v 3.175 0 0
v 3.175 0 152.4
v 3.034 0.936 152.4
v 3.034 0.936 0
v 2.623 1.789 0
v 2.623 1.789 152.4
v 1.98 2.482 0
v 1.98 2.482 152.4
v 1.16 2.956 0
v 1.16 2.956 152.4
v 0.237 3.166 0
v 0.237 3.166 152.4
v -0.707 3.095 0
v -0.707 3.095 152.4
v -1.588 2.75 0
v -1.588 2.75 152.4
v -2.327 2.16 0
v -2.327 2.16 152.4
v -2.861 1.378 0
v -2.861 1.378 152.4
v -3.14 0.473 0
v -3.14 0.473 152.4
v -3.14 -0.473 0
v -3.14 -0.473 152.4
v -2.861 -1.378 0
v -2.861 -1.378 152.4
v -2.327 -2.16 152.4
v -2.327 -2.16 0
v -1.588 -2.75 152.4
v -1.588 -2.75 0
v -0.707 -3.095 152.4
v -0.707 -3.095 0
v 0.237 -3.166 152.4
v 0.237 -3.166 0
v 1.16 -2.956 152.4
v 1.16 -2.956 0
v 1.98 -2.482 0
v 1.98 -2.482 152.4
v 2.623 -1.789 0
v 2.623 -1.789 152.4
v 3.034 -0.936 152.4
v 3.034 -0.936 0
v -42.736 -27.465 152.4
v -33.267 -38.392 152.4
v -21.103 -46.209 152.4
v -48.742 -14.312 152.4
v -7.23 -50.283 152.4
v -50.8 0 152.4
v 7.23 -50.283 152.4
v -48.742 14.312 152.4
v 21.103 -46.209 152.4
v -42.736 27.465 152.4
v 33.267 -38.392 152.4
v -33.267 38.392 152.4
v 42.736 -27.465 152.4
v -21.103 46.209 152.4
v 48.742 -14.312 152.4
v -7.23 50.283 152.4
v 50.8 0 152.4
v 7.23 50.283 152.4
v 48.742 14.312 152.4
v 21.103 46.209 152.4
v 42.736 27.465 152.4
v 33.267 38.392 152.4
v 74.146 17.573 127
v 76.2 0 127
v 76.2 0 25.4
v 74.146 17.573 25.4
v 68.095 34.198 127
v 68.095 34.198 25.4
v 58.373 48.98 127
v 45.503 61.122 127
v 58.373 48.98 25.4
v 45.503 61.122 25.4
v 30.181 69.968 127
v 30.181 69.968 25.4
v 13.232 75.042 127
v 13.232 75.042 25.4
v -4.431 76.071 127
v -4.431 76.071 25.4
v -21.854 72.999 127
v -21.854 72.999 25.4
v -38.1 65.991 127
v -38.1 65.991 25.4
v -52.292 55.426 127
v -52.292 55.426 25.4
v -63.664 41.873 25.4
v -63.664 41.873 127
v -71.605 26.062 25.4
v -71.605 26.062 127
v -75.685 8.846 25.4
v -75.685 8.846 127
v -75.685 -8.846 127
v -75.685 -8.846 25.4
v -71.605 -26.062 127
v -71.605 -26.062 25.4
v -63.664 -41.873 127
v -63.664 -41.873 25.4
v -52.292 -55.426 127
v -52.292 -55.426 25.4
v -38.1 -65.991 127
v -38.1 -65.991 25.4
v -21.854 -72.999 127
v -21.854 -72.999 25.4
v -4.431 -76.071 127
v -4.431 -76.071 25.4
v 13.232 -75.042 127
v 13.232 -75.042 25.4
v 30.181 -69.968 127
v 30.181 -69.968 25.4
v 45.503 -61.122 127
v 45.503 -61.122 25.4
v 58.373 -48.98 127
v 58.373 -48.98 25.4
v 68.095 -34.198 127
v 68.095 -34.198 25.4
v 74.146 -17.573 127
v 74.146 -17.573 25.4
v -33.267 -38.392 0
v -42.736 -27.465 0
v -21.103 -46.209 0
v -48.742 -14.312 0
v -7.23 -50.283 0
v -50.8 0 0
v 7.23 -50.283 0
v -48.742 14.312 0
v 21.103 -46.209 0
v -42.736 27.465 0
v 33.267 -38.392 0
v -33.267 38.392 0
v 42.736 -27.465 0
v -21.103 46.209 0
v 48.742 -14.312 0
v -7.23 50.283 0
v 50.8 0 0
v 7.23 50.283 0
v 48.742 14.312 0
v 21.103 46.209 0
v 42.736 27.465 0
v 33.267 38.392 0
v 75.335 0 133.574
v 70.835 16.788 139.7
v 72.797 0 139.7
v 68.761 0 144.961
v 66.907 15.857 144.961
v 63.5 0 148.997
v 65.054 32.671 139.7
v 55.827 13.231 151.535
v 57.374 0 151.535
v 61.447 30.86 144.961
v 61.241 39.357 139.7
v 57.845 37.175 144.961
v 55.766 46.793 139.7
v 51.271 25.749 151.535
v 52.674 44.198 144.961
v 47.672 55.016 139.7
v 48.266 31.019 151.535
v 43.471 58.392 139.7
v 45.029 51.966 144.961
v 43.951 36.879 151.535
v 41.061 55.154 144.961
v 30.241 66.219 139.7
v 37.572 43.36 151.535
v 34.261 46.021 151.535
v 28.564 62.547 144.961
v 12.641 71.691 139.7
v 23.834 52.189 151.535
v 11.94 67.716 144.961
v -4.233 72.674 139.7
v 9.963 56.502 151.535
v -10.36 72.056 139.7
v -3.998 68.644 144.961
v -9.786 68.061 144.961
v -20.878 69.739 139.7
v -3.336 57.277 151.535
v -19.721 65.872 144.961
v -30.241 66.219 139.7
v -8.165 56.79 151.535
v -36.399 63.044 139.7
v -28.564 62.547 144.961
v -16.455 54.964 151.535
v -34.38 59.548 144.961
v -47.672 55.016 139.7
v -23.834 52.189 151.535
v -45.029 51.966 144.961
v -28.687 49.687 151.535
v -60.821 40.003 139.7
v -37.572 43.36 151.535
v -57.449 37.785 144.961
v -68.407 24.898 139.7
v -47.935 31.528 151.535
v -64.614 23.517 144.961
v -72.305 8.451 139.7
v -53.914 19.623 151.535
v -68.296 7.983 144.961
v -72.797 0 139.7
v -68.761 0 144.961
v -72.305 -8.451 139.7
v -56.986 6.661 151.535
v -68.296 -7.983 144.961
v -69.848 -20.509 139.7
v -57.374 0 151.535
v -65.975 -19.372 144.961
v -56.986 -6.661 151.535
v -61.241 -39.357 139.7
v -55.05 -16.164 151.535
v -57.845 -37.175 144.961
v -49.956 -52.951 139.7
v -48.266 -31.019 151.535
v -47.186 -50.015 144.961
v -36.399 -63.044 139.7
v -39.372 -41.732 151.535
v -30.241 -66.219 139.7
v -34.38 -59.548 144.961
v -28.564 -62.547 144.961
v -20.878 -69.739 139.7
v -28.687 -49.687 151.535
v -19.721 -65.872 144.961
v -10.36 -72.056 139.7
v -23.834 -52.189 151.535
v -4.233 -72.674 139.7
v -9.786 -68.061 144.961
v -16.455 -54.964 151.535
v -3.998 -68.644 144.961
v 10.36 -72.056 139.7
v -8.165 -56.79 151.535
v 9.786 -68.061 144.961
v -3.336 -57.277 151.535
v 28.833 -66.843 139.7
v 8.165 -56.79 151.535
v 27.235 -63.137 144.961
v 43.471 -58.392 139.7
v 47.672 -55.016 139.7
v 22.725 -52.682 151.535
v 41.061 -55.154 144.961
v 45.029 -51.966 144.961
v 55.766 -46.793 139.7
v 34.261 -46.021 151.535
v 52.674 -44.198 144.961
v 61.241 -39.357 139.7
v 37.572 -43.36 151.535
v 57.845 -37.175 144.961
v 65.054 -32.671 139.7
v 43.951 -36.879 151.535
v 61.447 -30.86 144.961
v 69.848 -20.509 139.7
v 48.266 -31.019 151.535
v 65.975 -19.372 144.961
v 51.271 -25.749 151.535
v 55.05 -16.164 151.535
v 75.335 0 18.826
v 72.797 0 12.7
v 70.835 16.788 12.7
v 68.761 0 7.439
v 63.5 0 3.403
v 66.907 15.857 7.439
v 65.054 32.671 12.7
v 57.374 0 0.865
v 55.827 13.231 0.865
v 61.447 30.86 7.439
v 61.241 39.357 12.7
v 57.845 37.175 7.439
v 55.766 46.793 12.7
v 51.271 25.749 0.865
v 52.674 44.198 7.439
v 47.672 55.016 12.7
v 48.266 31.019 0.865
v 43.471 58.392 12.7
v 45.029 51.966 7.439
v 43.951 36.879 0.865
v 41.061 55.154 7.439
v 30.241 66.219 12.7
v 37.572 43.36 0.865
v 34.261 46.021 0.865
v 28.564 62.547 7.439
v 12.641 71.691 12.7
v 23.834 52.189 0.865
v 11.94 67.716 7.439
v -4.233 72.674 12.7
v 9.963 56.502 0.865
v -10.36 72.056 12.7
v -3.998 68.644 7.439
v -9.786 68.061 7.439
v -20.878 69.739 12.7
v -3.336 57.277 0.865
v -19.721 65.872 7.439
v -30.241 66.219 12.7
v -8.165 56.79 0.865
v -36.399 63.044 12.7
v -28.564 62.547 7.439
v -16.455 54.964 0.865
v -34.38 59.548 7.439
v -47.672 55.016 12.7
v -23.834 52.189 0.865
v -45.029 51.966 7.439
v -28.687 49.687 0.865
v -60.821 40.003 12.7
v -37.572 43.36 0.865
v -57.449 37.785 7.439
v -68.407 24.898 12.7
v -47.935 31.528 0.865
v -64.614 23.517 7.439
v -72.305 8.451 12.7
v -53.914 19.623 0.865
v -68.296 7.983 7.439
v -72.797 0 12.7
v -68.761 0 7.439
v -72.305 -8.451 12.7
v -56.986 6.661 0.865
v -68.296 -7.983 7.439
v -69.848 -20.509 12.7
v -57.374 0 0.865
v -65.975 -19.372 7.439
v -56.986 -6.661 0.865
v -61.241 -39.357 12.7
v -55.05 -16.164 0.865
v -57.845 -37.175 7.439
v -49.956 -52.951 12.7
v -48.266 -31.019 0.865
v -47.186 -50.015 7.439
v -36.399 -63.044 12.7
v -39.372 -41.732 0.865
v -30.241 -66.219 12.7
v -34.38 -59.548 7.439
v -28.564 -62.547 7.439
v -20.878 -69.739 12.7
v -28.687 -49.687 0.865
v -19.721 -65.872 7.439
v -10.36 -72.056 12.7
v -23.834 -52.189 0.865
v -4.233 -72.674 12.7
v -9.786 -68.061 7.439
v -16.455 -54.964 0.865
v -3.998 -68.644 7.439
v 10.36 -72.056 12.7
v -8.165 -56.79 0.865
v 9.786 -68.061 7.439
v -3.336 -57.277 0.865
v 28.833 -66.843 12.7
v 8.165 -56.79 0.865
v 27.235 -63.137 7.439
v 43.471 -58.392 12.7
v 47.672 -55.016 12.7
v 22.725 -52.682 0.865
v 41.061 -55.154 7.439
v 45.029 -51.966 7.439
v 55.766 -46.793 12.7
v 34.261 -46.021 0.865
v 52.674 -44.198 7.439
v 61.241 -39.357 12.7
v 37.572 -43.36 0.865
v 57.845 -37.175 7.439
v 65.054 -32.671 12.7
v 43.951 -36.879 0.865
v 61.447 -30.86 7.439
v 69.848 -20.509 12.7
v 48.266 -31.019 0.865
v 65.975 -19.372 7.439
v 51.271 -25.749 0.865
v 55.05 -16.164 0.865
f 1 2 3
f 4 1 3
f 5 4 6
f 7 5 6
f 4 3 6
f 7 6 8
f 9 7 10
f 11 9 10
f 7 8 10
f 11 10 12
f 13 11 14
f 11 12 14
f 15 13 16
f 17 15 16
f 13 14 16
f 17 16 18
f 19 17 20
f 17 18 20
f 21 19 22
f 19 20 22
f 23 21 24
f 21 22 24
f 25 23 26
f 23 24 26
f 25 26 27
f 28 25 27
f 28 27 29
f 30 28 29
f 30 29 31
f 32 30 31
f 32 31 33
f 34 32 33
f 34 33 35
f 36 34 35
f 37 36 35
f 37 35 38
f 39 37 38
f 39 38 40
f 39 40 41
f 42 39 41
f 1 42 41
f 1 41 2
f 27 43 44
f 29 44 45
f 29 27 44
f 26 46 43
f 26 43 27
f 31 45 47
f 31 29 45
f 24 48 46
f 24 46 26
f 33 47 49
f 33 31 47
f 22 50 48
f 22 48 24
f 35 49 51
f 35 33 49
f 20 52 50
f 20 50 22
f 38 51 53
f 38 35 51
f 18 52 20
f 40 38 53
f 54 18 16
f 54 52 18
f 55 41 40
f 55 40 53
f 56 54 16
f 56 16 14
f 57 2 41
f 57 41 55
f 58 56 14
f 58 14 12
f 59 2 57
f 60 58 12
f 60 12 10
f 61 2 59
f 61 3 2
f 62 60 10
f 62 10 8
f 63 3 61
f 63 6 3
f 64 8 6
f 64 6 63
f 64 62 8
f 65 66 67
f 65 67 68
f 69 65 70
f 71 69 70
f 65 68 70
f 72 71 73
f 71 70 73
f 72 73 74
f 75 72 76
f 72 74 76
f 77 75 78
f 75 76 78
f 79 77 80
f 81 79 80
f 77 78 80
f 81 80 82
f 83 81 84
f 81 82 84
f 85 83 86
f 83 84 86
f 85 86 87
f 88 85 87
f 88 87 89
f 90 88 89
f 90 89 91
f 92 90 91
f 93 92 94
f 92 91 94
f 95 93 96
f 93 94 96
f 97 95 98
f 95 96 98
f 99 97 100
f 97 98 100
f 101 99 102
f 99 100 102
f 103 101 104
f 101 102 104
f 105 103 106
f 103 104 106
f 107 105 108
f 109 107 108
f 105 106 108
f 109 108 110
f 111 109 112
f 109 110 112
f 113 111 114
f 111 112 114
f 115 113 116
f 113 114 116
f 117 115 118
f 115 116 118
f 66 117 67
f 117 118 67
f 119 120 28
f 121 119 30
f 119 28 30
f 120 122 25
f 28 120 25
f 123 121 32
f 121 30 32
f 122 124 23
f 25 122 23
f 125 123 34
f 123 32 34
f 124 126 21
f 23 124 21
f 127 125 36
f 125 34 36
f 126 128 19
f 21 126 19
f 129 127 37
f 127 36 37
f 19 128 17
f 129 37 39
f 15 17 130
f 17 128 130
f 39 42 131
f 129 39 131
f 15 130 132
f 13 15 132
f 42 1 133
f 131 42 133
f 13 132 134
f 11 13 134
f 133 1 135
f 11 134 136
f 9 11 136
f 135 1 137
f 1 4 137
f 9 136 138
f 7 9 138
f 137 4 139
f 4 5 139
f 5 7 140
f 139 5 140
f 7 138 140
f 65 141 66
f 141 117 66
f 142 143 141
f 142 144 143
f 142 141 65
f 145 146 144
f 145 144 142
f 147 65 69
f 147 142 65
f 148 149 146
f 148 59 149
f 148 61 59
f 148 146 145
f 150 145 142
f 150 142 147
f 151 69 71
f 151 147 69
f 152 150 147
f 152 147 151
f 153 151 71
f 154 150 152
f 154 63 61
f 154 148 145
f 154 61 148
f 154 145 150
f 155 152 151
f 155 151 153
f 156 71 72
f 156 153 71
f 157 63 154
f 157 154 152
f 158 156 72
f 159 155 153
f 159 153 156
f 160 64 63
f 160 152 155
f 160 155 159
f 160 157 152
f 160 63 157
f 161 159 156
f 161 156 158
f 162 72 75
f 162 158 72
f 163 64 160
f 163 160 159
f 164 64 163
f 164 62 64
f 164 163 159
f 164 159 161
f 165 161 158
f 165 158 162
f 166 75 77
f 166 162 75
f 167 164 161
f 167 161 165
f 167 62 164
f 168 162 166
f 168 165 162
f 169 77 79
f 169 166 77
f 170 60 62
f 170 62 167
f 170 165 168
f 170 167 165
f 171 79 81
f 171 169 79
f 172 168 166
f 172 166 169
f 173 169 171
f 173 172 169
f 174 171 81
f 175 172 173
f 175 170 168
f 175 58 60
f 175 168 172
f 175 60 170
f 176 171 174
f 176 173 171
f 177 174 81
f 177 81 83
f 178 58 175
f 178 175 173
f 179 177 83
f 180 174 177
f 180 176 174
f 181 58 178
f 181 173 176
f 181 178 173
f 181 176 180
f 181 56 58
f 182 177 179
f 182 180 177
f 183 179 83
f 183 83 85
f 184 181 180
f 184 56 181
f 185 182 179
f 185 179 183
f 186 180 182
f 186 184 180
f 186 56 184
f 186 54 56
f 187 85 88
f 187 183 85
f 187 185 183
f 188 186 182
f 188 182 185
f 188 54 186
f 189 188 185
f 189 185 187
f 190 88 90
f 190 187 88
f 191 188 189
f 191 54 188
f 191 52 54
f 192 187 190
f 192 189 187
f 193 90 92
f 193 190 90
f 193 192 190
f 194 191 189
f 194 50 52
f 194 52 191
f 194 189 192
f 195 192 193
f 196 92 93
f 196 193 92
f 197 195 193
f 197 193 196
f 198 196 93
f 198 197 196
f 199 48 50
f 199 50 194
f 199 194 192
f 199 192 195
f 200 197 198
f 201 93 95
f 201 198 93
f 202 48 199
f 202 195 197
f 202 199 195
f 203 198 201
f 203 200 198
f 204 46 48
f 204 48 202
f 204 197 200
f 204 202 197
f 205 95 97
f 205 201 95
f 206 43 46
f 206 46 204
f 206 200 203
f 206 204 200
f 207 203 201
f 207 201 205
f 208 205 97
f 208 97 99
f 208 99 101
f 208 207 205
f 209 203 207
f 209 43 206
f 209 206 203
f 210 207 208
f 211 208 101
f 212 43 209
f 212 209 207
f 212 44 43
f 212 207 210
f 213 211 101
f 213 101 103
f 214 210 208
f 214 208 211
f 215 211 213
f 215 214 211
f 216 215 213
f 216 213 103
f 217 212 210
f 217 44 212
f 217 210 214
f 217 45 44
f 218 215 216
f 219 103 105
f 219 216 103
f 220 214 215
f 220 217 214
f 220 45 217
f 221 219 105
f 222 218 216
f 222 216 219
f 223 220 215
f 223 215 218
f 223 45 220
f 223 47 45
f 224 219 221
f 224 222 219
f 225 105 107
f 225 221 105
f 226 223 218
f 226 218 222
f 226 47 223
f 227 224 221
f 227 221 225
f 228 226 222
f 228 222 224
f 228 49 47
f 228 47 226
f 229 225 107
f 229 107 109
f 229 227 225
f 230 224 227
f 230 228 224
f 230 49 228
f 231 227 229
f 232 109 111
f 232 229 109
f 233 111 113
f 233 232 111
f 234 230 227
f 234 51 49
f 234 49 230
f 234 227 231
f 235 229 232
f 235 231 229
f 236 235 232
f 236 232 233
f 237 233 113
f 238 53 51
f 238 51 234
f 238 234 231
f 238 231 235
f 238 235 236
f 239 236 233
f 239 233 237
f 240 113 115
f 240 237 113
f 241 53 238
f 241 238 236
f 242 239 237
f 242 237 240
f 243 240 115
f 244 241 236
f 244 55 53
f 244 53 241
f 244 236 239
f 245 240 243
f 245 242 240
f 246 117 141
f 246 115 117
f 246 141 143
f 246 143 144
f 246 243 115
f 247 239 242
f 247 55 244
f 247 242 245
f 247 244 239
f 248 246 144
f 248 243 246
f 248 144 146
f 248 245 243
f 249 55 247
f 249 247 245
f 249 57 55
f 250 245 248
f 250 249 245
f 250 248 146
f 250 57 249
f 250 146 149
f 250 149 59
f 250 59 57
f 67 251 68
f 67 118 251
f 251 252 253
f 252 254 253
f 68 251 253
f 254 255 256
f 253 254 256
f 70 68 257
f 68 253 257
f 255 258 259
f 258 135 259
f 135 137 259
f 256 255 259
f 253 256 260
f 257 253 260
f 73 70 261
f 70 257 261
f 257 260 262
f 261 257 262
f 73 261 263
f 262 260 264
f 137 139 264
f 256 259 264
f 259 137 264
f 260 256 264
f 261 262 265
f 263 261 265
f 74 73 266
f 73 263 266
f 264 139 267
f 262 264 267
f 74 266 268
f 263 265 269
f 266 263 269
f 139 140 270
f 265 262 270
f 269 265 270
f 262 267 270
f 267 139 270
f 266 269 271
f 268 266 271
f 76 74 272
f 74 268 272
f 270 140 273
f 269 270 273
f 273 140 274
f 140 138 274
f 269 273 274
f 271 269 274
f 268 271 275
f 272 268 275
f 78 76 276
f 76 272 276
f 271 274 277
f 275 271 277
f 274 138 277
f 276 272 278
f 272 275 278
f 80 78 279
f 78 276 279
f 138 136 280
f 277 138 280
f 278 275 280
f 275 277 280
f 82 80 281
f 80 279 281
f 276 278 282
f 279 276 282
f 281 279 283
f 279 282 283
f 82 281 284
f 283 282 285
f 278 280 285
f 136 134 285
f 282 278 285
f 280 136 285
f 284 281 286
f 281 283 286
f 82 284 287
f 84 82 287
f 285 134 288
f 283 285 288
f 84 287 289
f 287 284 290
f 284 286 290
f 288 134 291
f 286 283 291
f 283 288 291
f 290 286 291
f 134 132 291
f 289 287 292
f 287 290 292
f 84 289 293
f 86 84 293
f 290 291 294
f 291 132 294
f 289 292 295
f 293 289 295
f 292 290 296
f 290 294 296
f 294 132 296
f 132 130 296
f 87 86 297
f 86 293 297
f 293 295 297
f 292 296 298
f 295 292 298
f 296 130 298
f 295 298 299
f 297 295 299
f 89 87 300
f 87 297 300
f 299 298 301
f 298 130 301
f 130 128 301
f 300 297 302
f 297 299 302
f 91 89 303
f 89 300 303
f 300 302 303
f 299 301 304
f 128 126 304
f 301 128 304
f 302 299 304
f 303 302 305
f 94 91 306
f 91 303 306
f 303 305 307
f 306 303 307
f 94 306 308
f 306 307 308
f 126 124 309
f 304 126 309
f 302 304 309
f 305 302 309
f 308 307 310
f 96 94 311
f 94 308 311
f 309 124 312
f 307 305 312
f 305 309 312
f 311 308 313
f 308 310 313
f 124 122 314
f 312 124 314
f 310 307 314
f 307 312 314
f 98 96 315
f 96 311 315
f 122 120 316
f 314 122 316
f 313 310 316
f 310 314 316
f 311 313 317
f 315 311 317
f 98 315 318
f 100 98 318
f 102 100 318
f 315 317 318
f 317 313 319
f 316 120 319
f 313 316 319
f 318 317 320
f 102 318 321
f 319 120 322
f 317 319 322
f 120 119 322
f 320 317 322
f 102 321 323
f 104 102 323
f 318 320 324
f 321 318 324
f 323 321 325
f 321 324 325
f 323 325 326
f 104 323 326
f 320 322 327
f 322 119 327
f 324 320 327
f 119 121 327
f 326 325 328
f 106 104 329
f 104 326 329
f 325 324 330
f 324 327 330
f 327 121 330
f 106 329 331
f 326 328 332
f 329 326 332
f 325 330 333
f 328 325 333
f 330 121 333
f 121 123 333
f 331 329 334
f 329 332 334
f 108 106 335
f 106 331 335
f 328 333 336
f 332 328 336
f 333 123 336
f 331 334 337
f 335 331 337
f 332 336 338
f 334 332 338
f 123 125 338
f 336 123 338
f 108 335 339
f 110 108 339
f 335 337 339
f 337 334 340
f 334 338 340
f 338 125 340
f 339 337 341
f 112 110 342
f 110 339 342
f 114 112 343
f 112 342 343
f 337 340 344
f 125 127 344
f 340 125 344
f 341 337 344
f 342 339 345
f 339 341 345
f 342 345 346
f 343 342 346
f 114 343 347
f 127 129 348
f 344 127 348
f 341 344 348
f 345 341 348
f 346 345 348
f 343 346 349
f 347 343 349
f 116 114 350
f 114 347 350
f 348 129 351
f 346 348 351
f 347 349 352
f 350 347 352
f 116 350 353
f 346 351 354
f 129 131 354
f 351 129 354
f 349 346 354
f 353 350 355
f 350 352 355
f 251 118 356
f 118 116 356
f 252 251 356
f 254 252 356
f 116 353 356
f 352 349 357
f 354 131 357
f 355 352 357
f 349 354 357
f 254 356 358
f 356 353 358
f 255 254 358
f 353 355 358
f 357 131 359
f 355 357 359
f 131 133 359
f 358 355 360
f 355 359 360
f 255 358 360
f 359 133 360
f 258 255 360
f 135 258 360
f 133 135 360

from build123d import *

# Parameters (mm, degrees)
F0_R     = 76.2
F1_DEPTH = 152.4
F2_R     = 25.4
F3_R     = 3.175
F4_DEPTH = 254


with BuildPart() as f1:
    # F0 (on Top) → F1 (new body)
    with BuildSketch(Plane.XY):
        Circle(F0_R)
    extrude(amount=F1_DEPTH)

    # F2
    f2_edges = [f1.edges().sort_by_distance(p)[0] for p in [
        (76.2, 0, 76.2),
        (-76.2, 0, 0),
        (-76.2, 0, 152.4),
    ]]
    fillet(f2_edges, radius=F2_R)

    # F3 (on face) → F4 (cut)
    with BuildSketch(Plane.XY.offset(152.4)):
        Circle(F3_R)
    extrude(amount=-F4_DEPTH, mode=Mode.SUBTRACT)


solid = f1.part
